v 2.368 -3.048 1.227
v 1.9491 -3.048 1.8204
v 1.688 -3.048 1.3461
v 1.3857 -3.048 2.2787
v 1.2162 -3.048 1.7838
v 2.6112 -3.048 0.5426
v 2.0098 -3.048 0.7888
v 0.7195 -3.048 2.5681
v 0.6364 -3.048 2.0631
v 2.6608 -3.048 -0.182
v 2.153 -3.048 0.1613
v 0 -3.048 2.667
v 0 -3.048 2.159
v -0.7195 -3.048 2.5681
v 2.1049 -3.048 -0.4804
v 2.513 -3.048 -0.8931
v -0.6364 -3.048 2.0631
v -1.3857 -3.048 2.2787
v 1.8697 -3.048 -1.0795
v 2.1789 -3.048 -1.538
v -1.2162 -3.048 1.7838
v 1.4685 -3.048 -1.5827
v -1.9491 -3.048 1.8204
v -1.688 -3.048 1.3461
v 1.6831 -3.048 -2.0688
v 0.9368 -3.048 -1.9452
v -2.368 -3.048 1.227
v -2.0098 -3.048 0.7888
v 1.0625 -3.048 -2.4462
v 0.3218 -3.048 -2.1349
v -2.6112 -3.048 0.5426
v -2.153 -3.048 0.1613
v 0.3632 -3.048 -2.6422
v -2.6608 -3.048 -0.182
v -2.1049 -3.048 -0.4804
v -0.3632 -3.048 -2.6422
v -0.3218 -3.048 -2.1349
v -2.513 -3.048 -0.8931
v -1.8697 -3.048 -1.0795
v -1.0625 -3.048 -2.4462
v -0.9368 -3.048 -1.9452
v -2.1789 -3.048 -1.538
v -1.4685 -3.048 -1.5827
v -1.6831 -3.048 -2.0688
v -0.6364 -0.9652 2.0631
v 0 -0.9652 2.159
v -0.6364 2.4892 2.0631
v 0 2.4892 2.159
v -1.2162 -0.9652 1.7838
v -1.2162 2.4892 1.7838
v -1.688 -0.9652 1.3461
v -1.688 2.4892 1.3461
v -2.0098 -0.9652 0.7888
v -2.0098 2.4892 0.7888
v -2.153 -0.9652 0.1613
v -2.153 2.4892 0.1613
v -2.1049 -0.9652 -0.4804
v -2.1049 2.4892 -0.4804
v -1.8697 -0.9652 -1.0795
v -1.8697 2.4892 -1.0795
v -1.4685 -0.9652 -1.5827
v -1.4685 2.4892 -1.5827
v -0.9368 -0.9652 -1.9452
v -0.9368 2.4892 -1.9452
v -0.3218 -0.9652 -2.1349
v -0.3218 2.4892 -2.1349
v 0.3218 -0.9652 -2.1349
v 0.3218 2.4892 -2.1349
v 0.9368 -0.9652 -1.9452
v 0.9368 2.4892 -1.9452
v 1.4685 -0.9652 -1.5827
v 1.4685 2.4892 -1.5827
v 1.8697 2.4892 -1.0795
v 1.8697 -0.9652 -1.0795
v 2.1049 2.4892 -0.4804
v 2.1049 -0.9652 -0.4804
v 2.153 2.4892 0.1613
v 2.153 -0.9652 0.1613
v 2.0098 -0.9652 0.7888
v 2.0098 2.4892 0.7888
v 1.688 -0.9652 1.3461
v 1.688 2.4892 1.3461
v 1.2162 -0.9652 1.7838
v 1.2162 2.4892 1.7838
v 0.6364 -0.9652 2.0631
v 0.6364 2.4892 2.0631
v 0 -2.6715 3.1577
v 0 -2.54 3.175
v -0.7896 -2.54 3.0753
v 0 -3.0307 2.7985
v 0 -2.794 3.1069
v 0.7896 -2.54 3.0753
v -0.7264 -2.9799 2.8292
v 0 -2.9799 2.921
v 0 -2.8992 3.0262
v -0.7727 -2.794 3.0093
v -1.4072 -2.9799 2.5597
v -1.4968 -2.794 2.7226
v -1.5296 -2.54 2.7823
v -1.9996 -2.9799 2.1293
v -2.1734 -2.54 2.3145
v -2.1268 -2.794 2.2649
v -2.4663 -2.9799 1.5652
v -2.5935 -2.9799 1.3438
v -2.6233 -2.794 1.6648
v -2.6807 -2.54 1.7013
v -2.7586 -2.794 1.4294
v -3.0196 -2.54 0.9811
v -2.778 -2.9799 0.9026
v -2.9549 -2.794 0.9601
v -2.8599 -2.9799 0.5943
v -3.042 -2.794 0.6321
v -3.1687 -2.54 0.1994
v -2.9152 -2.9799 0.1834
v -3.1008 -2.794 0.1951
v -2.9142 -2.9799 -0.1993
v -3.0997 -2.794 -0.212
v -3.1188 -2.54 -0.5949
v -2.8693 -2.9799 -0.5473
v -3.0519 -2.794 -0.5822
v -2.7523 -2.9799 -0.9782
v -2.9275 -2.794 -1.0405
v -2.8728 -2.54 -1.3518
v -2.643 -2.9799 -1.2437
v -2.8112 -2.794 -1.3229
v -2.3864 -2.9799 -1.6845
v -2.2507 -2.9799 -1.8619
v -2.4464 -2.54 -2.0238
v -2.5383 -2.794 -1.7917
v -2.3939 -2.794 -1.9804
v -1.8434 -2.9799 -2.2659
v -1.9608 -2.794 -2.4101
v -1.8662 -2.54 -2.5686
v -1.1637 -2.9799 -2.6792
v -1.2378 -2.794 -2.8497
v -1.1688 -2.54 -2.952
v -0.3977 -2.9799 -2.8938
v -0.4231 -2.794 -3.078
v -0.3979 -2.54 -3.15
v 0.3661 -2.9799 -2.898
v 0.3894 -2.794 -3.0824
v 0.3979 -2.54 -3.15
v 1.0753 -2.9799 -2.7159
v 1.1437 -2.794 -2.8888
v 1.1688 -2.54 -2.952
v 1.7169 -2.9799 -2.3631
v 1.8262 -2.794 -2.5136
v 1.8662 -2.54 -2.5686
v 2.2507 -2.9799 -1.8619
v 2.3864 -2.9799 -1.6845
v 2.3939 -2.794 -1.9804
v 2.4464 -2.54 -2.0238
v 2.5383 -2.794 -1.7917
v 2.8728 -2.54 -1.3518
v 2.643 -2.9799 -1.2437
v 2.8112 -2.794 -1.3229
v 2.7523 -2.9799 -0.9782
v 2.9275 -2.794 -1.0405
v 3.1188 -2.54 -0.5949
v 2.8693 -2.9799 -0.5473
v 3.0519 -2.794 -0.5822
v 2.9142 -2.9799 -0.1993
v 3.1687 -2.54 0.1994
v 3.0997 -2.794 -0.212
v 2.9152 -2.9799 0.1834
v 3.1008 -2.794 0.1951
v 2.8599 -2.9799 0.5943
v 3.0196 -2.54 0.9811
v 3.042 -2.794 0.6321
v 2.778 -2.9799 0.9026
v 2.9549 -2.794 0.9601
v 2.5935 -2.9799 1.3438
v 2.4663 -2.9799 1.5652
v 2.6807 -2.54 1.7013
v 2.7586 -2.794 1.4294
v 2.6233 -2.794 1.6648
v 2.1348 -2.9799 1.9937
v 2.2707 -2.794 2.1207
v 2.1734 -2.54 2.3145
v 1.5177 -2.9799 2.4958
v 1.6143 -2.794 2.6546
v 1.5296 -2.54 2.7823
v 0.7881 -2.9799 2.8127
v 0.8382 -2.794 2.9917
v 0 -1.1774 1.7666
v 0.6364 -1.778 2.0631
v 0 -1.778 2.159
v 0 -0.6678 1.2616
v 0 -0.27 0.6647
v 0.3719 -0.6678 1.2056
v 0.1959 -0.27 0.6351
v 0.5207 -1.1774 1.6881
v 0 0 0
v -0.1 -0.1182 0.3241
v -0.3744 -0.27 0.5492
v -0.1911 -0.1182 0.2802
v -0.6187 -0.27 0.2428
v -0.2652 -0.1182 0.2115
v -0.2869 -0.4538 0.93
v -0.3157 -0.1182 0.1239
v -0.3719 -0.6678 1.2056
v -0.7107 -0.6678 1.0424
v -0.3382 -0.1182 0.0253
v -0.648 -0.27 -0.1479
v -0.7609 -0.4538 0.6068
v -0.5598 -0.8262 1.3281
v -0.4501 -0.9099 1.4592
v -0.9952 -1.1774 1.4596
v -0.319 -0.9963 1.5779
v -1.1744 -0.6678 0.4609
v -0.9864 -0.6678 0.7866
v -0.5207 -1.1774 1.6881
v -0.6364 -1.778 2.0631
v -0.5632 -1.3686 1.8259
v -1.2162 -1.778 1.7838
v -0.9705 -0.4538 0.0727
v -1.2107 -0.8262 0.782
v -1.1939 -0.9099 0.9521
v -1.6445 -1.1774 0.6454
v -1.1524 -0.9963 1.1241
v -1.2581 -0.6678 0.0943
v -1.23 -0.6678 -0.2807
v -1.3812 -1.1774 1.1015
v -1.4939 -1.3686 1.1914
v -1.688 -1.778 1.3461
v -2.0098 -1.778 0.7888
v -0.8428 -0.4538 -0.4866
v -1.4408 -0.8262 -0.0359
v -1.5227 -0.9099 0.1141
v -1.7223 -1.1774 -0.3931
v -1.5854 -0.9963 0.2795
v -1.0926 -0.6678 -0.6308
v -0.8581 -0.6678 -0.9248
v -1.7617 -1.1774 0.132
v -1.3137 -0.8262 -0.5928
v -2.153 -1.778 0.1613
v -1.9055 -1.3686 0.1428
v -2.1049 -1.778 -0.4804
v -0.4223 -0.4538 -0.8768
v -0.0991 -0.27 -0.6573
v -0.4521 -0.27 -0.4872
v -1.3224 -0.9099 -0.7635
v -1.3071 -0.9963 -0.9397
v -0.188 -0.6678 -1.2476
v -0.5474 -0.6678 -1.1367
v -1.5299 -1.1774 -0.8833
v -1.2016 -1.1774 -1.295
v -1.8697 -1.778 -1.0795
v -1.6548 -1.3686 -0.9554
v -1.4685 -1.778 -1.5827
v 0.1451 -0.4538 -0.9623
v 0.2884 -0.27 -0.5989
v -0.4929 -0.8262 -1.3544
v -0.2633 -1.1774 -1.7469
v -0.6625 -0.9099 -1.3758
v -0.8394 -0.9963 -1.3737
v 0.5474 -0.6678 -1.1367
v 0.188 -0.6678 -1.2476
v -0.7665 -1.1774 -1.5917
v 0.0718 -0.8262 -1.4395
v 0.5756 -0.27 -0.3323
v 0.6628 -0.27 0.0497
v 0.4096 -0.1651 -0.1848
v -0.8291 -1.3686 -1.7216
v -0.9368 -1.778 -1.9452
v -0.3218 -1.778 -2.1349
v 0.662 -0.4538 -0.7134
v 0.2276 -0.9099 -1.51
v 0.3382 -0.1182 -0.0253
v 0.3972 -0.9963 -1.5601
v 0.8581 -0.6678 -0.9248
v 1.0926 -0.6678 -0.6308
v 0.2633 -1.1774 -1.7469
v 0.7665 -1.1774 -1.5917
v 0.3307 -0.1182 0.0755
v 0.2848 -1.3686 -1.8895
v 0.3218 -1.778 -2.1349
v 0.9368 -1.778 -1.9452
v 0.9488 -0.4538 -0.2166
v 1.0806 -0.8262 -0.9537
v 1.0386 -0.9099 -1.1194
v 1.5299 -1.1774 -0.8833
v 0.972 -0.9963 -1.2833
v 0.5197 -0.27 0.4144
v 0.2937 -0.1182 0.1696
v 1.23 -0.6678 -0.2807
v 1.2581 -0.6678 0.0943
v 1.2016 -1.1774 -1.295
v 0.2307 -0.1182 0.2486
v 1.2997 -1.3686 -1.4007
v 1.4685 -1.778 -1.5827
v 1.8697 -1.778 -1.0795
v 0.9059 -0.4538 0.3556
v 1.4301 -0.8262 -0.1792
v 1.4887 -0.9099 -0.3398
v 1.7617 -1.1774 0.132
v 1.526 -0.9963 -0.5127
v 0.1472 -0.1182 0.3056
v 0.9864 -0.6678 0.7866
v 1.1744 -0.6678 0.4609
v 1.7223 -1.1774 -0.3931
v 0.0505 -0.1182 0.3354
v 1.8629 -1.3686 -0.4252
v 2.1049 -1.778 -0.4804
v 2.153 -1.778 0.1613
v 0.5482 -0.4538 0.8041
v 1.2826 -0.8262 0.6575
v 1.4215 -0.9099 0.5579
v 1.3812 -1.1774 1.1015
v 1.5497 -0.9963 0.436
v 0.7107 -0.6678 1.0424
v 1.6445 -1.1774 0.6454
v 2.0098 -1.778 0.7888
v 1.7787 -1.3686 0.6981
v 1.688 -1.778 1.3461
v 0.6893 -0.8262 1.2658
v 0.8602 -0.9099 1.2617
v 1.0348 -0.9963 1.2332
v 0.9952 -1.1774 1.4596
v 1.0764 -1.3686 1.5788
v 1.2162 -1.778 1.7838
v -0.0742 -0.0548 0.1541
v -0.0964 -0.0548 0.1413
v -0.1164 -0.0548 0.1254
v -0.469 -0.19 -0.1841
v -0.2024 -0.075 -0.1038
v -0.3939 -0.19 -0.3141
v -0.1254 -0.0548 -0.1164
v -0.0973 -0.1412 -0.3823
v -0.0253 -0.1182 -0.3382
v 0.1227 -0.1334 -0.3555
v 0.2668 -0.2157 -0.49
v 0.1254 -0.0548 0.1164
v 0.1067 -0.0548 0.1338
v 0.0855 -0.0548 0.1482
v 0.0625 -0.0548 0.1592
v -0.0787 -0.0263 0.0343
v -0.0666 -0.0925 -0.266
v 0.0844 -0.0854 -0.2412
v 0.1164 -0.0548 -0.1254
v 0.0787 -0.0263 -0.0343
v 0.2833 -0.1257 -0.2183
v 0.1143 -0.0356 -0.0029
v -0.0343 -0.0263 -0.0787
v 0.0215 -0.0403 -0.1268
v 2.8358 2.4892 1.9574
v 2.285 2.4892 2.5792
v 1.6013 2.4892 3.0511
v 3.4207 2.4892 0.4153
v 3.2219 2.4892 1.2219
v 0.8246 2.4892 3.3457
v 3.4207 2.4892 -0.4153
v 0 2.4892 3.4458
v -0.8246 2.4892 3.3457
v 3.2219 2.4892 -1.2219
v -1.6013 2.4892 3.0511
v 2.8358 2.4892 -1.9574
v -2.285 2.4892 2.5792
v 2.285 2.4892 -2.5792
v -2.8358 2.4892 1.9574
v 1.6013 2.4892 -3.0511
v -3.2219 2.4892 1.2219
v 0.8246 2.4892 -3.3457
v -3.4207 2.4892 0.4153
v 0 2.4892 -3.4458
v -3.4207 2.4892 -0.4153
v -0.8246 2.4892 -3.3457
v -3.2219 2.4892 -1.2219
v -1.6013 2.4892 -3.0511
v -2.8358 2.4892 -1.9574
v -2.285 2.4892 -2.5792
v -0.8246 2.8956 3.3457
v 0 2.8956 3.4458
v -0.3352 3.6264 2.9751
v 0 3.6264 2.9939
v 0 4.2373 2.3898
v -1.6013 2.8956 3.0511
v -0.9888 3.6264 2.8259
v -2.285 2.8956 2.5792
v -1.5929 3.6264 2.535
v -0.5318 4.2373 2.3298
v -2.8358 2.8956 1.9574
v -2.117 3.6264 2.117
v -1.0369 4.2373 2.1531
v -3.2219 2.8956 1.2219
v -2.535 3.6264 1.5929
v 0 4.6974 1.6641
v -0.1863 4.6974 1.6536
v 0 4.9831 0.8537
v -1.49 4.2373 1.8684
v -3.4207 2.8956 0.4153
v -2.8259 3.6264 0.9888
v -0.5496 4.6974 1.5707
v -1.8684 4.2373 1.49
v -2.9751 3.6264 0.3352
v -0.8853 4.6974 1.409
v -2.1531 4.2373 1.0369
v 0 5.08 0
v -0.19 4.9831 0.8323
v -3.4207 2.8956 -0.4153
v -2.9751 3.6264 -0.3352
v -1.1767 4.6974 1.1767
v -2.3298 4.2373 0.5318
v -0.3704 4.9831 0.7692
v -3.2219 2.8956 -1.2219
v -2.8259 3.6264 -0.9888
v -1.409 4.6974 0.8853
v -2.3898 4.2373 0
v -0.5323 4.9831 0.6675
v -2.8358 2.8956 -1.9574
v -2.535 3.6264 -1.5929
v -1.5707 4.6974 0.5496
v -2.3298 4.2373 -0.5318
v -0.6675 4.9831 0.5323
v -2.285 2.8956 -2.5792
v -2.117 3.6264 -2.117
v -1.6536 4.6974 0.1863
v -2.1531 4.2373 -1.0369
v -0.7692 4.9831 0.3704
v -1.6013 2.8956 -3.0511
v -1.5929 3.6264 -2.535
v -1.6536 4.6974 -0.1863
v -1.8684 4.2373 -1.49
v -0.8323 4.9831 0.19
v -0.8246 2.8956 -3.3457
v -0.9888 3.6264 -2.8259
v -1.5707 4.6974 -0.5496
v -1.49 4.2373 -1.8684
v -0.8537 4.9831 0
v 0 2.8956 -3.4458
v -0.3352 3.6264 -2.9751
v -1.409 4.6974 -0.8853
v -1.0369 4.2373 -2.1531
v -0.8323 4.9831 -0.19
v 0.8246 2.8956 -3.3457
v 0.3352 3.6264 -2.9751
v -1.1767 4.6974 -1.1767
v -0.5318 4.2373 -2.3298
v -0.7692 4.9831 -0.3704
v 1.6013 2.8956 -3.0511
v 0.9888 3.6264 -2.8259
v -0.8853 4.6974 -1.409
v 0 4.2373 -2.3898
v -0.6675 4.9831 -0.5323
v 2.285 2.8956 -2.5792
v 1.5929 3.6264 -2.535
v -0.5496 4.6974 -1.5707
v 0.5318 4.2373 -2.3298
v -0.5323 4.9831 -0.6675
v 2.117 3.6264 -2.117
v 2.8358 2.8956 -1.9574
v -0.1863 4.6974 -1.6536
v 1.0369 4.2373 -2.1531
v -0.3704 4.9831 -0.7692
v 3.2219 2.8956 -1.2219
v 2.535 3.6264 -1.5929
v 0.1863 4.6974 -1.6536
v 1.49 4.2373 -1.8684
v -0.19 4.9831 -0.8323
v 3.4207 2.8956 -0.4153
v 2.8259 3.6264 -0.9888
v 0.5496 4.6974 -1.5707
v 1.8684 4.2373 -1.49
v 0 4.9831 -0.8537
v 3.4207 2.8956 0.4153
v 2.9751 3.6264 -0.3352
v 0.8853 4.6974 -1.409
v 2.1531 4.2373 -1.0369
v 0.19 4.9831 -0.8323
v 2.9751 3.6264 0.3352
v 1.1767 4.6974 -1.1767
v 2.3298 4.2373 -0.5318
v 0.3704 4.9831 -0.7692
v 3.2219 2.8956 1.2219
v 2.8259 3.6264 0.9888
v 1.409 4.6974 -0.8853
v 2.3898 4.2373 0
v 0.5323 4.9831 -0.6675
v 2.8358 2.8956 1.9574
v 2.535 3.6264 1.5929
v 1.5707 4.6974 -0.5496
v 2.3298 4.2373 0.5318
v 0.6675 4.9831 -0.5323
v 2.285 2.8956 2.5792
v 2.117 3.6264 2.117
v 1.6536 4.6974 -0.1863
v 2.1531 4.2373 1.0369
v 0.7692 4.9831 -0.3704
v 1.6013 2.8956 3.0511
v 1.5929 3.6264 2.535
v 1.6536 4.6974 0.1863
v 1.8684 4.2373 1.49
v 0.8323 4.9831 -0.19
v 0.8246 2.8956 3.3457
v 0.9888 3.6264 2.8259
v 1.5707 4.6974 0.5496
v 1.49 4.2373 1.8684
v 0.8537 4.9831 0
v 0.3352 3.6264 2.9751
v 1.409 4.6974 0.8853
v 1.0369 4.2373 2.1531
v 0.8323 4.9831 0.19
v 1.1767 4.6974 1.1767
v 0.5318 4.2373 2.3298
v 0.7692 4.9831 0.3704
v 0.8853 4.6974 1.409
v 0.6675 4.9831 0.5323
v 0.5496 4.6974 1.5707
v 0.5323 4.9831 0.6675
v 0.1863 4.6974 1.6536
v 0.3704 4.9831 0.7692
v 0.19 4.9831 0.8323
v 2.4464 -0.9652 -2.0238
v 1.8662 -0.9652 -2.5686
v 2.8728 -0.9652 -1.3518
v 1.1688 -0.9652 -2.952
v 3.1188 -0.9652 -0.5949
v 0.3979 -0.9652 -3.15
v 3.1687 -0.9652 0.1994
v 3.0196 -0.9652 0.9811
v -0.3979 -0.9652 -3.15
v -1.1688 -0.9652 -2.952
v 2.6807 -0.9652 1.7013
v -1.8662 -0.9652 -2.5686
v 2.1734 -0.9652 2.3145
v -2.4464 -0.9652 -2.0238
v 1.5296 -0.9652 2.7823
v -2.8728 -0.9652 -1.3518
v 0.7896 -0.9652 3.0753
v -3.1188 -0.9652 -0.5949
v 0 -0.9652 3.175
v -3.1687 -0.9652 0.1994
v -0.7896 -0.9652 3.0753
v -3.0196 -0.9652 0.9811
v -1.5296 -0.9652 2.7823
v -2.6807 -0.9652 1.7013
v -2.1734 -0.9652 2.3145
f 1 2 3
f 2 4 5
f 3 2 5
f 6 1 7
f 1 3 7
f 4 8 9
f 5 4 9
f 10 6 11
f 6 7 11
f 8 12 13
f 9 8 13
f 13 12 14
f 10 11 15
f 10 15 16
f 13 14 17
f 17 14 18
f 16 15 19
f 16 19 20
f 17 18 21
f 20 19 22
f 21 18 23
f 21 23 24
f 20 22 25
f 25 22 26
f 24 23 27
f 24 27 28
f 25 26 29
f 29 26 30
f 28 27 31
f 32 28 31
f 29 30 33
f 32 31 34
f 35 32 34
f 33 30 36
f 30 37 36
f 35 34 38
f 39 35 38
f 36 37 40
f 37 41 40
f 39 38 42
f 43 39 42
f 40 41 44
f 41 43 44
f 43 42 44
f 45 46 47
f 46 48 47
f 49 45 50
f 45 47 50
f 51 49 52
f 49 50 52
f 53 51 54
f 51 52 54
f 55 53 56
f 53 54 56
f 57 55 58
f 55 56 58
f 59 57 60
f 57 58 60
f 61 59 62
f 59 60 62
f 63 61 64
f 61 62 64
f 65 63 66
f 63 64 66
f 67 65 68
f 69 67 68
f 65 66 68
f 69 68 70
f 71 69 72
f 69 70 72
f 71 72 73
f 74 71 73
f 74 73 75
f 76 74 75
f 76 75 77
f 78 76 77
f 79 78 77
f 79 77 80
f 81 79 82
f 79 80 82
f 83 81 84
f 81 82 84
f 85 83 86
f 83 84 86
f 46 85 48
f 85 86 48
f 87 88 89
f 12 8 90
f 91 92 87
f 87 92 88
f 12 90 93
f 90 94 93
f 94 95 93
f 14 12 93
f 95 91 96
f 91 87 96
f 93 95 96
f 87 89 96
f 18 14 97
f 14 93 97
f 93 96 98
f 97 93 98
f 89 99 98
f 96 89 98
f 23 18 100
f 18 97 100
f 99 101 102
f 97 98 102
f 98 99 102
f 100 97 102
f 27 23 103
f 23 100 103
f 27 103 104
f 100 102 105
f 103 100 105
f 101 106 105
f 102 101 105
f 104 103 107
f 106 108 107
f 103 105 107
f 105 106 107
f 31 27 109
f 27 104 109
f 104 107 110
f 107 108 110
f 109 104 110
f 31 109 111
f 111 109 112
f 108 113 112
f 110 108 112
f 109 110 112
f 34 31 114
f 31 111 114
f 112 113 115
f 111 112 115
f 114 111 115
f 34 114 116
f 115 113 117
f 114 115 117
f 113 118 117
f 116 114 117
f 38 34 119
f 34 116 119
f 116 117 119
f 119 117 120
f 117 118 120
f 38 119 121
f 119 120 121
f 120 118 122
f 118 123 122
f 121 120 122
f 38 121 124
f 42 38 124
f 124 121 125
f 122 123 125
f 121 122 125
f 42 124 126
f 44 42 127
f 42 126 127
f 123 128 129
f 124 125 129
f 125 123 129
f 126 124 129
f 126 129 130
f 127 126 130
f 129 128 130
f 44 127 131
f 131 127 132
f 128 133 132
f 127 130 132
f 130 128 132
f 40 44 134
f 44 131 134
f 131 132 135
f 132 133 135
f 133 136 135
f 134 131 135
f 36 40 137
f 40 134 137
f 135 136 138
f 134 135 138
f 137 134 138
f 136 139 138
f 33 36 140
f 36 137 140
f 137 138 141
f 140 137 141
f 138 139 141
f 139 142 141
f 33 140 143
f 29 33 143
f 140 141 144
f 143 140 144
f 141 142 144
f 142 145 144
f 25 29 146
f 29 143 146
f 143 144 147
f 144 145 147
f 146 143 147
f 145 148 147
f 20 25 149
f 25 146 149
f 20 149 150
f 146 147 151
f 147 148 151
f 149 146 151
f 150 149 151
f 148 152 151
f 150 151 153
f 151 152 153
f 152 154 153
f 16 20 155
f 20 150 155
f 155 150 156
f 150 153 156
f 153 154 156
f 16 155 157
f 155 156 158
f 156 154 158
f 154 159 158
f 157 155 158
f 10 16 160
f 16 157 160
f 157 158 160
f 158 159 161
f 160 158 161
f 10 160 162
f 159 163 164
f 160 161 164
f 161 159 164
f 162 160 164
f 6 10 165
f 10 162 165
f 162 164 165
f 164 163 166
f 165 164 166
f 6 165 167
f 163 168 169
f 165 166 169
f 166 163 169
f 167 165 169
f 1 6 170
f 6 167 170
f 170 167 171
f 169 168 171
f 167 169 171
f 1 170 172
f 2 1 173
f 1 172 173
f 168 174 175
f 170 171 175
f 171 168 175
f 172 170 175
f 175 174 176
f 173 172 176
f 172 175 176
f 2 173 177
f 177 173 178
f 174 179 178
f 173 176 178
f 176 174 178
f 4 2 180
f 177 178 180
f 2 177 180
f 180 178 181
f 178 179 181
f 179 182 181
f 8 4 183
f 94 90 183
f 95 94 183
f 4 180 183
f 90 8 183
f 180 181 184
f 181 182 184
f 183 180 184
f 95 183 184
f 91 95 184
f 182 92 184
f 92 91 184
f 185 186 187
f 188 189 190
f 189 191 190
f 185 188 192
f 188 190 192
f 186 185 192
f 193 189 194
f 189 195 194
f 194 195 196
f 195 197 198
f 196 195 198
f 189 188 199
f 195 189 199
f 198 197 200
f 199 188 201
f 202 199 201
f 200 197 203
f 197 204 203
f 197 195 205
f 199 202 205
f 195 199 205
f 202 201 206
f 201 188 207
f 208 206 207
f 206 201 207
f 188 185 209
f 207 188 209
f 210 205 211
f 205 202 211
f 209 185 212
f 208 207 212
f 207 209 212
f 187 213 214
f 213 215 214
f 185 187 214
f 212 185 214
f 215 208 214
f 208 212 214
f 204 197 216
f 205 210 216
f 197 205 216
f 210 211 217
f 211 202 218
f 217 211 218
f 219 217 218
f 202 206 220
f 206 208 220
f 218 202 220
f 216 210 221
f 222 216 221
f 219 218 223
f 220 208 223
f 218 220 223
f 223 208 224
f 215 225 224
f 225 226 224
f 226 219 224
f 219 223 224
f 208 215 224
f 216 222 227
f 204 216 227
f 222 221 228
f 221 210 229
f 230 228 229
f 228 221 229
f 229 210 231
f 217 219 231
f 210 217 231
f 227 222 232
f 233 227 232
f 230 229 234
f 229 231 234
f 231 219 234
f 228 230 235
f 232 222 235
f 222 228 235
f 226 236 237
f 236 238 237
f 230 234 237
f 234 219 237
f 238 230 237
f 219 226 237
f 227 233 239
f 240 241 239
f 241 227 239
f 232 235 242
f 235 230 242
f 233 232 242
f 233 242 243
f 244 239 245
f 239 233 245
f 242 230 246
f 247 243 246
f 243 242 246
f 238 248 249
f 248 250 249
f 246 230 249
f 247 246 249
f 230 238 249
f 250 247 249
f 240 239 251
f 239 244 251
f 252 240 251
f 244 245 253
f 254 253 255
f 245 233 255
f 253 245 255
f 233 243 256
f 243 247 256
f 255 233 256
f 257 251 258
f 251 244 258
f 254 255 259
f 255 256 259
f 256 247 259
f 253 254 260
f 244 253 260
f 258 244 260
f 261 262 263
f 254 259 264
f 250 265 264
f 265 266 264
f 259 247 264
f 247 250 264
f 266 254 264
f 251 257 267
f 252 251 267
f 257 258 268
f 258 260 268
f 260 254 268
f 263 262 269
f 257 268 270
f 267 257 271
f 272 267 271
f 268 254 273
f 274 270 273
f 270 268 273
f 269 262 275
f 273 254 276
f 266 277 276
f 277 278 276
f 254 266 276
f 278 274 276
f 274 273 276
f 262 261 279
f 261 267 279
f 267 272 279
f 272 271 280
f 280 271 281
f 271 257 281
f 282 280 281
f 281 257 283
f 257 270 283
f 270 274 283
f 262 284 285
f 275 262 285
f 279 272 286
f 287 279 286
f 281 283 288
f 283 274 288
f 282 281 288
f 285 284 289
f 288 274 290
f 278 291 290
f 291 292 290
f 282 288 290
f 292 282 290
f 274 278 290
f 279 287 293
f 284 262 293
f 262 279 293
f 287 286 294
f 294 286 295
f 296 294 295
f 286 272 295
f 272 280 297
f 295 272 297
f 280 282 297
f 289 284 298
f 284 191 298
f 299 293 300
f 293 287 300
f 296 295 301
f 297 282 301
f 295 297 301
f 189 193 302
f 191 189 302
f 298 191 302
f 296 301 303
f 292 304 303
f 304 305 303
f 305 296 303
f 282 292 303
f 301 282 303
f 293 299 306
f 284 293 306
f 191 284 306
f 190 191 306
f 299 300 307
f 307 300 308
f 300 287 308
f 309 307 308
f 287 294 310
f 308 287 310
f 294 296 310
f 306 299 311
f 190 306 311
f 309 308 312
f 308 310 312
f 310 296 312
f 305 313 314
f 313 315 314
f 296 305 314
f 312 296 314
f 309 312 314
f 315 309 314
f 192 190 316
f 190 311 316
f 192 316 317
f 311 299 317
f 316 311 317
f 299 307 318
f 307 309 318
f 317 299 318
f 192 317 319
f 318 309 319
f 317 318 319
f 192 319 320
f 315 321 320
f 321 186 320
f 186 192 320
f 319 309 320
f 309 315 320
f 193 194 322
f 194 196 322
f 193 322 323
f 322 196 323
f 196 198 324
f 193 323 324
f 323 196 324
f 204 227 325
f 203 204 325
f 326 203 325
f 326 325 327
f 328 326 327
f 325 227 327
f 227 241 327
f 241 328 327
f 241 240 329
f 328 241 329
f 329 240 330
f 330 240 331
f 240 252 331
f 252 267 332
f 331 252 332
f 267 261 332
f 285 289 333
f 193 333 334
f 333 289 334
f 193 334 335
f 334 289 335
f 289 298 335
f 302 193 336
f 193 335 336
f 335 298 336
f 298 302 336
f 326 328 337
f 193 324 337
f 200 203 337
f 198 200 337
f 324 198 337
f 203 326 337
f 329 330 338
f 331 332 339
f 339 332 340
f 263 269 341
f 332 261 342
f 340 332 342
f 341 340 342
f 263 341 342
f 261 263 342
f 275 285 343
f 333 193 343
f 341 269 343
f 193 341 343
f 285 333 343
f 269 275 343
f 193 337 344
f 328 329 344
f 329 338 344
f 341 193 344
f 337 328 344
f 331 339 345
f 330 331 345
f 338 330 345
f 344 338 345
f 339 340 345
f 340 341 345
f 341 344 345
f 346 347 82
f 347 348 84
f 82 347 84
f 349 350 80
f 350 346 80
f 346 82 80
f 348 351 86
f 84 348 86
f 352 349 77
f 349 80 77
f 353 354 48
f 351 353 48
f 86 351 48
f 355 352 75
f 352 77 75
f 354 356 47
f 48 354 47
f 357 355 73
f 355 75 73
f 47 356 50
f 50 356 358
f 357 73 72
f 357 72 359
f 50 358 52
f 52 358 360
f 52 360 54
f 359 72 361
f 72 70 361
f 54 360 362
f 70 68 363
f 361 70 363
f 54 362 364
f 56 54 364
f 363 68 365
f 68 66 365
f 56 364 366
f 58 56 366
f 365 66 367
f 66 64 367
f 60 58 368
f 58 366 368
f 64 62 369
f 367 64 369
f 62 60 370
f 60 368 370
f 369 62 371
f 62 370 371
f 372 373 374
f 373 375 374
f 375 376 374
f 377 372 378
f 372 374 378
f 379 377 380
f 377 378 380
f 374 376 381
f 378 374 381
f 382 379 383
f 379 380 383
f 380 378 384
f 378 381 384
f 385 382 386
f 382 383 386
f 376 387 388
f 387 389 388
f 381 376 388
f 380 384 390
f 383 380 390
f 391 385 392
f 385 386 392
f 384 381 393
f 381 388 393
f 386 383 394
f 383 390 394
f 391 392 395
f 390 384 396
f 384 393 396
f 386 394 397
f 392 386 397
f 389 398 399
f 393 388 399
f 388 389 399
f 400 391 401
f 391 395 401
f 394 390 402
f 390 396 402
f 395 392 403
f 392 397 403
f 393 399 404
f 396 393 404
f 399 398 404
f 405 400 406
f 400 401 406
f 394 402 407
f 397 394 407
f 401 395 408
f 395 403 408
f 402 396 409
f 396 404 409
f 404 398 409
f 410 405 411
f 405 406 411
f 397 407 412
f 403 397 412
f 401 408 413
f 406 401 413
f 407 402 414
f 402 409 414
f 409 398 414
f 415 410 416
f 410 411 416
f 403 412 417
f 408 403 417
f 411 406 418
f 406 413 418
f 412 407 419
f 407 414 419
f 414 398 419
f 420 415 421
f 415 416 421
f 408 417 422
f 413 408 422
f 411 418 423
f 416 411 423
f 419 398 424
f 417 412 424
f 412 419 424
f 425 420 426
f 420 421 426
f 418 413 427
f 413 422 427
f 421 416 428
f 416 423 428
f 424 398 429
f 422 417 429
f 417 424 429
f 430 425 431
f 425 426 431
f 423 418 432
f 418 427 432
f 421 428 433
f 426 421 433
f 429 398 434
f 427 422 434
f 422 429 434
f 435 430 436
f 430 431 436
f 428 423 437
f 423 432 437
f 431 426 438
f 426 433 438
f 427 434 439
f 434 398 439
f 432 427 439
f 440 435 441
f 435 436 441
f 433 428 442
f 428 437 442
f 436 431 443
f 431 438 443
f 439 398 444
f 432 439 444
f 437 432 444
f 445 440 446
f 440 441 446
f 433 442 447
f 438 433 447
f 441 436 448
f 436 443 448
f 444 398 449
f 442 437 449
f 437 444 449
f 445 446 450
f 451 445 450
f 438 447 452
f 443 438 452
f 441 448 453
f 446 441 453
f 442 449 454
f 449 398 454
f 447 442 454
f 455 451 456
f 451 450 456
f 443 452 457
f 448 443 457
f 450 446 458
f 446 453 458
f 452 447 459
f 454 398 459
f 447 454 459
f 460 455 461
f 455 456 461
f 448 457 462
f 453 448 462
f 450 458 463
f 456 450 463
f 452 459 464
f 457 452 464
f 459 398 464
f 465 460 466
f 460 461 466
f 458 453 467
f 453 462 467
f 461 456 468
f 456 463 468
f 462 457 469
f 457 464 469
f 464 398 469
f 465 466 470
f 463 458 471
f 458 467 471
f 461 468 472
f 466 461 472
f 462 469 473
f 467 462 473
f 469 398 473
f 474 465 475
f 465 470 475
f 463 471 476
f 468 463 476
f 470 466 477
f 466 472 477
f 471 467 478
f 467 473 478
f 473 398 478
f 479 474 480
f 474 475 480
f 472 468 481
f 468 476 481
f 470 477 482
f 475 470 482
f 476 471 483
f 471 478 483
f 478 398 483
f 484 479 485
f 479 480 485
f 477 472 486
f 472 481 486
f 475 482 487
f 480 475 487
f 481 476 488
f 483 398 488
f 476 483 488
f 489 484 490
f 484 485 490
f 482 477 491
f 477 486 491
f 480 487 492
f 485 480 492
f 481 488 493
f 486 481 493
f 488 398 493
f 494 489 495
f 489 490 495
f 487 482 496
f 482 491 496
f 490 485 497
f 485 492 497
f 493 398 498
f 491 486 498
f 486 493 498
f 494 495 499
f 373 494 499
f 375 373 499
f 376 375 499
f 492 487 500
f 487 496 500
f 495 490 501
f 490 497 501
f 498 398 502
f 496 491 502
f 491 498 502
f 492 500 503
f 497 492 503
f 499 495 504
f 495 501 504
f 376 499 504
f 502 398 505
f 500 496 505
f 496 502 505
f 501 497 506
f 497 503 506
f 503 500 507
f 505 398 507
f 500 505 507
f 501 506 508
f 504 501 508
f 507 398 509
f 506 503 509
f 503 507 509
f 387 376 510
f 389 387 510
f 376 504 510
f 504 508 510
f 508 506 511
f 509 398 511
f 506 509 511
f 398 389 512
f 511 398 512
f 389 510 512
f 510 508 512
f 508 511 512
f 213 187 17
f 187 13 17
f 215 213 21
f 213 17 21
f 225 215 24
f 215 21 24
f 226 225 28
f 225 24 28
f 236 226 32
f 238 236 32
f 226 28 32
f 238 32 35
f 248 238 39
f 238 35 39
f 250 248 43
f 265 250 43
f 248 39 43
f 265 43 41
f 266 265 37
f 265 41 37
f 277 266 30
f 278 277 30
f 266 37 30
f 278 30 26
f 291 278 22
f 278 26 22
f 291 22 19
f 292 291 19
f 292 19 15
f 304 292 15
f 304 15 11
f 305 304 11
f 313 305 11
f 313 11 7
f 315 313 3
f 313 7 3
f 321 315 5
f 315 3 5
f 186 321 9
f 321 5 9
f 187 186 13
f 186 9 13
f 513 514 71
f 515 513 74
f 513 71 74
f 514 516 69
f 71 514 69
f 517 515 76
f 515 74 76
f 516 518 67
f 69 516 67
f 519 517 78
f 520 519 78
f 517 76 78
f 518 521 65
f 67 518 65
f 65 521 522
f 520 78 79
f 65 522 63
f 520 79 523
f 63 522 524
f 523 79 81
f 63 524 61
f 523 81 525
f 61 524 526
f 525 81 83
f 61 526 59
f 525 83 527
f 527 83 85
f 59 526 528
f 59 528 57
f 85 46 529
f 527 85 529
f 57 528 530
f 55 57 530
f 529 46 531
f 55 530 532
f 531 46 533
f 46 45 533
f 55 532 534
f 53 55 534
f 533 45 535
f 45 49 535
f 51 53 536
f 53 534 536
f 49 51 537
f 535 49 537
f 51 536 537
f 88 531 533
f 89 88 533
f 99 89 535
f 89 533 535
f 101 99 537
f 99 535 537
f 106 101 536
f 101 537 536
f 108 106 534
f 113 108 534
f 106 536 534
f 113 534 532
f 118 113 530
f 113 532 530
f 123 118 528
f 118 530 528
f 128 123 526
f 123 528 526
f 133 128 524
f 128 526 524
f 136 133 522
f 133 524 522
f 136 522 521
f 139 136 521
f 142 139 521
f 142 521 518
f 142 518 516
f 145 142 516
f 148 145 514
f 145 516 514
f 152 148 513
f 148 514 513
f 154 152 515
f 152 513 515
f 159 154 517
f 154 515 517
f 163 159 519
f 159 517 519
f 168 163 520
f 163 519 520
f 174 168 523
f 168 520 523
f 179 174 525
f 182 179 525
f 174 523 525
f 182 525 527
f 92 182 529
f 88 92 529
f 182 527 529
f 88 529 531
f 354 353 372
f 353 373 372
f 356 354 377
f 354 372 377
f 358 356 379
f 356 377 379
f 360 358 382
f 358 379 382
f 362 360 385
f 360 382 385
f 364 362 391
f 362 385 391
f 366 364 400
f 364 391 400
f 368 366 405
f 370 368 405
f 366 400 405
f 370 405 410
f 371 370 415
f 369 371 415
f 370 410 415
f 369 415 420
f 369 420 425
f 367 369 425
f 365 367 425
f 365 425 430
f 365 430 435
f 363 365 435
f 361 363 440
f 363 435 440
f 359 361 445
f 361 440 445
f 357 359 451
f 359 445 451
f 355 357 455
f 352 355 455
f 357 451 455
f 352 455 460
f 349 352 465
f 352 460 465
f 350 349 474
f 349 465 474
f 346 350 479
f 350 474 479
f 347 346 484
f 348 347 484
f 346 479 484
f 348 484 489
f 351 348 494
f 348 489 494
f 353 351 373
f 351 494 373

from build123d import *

# Parameters (mm, degrees)
FILLET1_R = 0.508


with BuildPart() as part:
    # Sketch1 → Revolve1 (revolve)
    with BuildSketch(Plane.XY, mode=Mode.PRIVATE) as revolve1_sk:
        with BuildLine():
            Line((0, 5.08), (0, 0))
            ThreePointArc((0, 0), (1.261643301, -0.667825992), (2.159, -1.778))
            Line((2.159, -1.778), (2.159, -3.048))
            Line((2.159, -3.048), (3.175, -3.048))
            Line((3.175, -3.048), (3.175, -0.9652))
            Line((3.175, -0.9652), (2.159, -0.9652))
            Line((2.159, -0.9652), (2.159, 2.4892))
            Line((2.159, 2.4892), (3.445798114, 2.4892))
            Line((3.445798114, 2.4892), (3.445798114, 2.8956))
            ThreePointArc((3.445798114, 2.8956), (2.039922057, 4.487890303), (0, 5.08))
        make_face()
    revolve(revolve1_sk.sketch.rotate(Axis((0, 5.379452632, 0), (0, -1, 0)), 90), axis=Axis((0, 5.379452632, 0), (0, -1, 0)))

    # Fillet1
    fillet1_edges = [part.edges().sort_by_distance(p)[0] for p in [
        (0, -3.048, -3.175),
    ]]
    fillet(fillet1_edges, radius=FILLET1_R)


solid = part.part
